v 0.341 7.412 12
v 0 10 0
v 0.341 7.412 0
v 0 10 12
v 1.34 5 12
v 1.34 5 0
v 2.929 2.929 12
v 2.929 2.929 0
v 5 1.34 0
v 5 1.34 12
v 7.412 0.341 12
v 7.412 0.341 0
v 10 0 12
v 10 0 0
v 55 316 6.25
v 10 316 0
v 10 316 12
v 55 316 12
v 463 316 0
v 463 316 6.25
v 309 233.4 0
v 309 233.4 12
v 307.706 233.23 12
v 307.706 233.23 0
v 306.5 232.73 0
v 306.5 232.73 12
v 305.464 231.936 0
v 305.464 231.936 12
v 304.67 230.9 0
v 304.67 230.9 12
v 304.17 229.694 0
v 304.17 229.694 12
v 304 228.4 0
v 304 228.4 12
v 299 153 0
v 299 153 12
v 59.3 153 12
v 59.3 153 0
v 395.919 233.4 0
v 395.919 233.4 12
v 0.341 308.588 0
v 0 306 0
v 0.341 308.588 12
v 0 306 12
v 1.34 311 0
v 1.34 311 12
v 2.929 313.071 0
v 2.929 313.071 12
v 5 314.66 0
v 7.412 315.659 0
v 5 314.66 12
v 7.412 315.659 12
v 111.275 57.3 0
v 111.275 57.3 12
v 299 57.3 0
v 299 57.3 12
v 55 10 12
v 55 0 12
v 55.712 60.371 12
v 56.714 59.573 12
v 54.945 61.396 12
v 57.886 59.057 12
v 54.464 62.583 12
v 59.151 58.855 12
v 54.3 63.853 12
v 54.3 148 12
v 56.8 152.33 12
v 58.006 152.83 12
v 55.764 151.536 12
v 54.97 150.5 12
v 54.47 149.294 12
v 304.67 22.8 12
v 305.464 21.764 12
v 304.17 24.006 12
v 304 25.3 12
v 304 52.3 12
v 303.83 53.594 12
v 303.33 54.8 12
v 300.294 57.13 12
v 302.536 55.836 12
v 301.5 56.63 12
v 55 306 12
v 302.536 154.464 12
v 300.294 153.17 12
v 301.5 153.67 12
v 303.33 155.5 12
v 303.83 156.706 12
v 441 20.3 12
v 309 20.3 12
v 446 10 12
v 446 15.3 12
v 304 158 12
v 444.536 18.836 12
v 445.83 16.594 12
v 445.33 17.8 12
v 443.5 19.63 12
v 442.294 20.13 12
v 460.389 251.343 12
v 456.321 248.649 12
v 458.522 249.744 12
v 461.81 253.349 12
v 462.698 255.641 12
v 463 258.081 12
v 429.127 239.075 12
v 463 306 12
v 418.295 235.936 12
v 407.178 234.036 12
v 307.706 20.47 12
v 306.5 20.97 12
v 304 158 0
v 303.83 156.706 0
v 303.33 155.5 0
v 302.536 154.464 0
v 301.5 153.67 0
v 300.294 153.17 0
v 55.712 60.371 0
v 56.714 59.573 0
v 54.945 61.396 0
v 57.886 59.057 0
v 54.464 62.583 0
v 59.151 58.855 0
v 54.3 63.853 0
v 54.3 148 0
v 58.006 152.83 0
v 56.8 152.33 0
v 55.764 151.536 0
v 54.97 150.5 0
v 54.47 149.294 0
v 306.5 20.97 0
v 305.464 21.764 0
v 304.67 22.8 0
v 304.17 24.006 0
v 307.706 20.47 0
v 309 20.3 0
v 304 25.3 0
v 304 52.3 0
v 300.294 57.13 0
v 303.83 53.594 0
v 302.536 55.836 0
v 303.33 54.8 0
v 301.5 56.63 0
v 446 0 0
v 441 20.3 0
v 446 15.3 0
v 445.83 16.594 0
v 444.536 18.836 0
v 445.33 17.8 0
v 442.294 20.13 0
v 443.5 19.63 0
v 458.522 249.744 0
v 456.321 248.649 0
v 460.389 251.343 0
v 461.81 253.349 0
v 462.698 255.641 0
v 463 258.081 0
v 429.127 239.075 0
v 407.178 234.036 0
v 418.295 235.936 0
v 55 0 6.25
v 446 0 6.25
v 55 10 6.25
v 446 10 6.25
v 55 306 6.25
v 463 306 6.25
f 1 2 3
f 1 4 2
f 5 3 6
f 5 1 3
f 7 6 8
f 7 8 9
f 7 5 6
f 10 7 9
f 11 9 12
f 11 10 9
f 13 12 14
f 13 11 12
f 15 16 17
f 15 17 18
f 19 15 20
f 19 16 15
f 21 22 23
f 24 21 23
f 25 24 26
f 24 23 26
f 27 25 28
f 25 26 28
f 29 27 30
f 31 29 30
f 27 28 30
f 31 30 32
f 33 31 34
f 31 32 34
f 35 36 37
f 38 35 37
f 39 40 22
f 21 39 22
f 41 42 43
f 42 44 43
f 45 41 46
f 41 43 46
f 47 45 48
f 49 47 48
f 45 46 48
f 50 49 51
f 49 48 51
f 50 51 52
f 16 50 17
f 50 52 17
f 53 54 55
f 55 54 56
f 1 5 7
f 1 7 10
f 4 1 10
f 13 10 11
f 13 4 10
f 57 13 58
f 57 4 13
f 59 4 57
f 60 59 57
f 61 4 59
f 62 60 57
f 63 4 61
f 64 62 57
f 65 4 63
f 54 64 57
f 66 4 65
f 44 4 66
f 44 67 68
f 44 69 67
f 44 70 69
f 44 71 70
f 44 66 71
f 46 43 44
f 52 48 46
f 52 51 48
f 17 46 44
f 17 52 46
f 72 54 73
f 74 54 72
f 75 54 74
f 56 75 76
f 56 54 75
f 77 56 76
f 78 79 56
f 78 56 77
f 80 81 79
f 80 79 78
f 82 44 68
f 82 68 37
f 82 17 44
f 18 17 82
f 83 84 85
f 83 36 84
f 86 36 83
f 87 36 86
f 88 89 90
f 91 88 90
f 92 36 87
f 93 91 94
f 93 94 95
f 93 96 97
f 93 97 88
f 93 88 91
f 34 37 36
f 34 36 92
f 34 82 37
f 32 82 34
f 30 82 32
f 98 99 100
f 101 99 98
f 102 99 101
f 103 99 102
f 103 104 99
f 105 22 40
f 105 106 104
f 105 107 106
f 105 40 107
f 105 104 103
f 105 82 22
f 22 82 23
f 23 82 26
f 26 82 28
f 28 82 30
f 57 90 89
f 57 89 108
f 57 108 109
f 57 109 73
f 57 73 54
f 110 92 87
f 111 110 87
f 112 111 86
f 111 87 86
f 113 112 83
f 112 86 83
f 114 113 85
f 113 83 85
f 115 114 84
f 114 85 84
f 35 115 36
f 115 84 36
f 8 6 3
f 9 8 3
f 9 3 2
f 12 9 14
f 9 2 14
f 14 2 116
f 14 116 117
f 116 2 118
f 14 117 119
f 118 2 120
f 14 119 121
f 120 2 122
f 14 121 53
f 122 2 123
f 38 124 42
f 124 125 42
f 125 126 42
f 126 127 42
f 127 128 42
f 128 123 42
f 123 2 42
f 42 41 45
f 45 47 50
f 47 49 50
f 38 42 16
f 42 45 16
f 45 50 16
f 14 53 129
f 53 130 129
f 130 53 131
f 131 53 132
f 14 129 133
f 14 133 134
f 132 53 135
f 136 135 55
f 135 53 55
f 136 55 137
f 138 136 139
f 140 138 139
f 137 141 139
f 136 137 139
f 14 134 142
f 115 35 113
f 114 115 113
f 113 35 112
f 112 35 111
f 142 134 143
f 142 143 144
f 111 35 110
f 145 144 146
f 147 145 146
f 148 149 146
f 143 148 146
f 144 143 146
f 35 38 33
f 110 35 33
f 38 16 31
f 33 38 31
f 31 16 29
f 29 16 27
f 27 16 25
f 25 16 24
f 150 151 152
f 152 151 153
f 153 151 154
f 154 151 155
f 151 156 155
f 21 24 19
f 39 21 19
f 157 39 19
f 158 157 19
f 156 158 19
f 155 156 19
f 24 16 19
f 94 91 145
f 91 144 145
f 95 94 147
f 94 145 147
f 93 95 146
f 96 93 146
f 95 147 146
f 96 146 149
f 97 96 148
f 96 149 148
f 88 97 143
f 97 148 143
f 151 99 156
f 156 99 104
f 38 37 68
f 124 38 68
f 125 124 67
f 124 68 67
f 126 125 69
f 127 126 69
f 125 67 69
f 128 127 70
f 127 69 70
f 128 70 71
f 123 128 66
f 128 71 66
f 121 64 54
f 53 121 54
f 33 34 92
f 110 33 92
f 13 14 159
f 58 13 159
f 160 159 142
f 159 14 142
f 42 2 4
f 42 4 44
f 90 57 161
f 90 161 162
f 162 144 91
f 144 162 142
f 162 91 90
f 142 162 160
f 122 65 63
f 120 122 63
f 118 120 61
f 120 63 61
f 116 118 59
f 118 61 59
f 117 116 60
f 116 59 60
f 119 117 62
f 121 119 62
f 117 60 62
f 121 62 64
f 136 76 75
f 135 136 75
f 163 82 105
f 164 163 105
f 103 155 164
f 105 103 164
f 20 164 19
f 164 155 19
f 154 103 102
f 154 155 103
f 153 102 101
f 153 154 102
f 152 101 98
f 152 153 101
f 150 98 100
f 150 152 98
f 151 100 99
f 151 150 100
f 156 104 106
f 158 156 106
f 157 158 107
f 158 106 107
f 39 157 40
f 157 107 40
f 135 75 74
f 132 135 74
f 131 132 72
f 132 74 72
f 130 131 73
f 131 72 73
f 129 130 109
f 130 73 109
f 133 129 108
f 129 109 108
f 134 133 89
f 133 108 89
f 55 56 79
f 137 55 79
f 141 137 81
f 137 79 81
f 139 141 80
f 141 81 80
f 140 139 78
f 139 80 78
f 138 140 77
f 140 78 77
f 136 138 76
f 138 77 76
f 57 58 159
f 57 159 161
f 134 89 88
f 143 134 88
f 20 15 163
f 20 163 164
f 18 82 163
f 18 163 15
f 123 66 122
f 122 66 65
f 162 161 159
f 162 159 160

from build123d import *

# Parameters (mm, degrees)
F0_W     = 463
F0_H     = 316
F1_DEPTH = 12
F3_DEPTH = 12.001
F4_W     = 408
F4_H     = 10
F4_W_2   = 391
F5_DEPTH = 5.75
F6_R     = 10
F7_R     = 5


with BuildPart() as f1:
    # F0 (on Top) → F1 (new body)
    with BuildSketch(Plane.XY):
        with Locations((231.5, 158)):
            Rectangle(F0_W, F0_H)
    extrude(amount=F1_DEPTH)

    # F2 (on face) → F3 (cut, through all)
    with BuildSketch(Plane.XY.offset(12)):
        with BuildLine():
            Line((395.9189609317, 233.4), (309, 233.4))
            ThreePointArc((309, 233.4), (305.4644660941, 231.9355339059), (304, 228.4))
            Line((304, 228.4), (304, 158))
            ThreePointArc((304, 158), (302.5355339059, 154.4644660941), (299, 153))
            Line((299, 153), (59.3, 153))
            ThreePointArc((59.3, 153), (55.7644660941, 151.5355339059), (54.3, 148))
            Line((54.3, 148), (54.3, 63.8530360718))
            ThreePointArc((54.3, 63.8530360718), (55.7121305741, 60.3706241228), (59.150877193, 58.8552603277))
            Line((59.150877193, 58.8552603277), (111.2746434829, 57.3))
            Line((111.2746434829, 57.3), (299, 57.3))
            ThreePointArc((299, 57.3), (302.5355339059, 55.8355339059), (304, 52.3))
            Line((304, 52.3), (304, 25.3))
            ThreePointArc((304, 25.3), (305.4644660941, 21.7644660941), (309, 20.3))
            Line((309, 20.3), (446, 20.3))
            Line((446, 20.3), (446, 0))
            Line((446, 0), (463, 0))
            Line((463, 0), (463, 20.3))
            Line((463, 20.3), (463, 233.4))
            Line((463, 233.4), (463, 251))
            Line((463, 251), (429.1265081015, 239.0747180711))
            ThreePointArc((429.1265081015, 239.0747180711), (412.7634230352, 234.8288881241), (395.9189609317, 233.4))
        make_face()
    extrude(amount=-F3_DEPTH, mode=Mode.SUBTRACT)

    # F4 (on face) → F5 (cut)
    with BuildSketch(Plane.XY.offset(12)):
        with Locations((259, 311)):
            Rectangle(F4_W, F4_H)
        with Locations((250.5, 5)):
            Rectangle(F4_W_2, F4_H)
    extrude(amount=-F5_DEPTH, mode=Mode.SUBTRACT)

    # F6
    f6_edges = [f1.edges().sort_by_distance(p)[0] for p in [
        (0, 316, 6),
        (0, 0, 6),
        (463, 251, 6),
    ]]
    fillet(f6_edges, radius=F6_R)

    # F7
    f7_edges = [f1.edges().sort_by_distance(p)[0] for p in [
        (446, 20.3, 6),
    ]]
    fillet(f7_edges, radius=F7_R)


solid = f1.part
